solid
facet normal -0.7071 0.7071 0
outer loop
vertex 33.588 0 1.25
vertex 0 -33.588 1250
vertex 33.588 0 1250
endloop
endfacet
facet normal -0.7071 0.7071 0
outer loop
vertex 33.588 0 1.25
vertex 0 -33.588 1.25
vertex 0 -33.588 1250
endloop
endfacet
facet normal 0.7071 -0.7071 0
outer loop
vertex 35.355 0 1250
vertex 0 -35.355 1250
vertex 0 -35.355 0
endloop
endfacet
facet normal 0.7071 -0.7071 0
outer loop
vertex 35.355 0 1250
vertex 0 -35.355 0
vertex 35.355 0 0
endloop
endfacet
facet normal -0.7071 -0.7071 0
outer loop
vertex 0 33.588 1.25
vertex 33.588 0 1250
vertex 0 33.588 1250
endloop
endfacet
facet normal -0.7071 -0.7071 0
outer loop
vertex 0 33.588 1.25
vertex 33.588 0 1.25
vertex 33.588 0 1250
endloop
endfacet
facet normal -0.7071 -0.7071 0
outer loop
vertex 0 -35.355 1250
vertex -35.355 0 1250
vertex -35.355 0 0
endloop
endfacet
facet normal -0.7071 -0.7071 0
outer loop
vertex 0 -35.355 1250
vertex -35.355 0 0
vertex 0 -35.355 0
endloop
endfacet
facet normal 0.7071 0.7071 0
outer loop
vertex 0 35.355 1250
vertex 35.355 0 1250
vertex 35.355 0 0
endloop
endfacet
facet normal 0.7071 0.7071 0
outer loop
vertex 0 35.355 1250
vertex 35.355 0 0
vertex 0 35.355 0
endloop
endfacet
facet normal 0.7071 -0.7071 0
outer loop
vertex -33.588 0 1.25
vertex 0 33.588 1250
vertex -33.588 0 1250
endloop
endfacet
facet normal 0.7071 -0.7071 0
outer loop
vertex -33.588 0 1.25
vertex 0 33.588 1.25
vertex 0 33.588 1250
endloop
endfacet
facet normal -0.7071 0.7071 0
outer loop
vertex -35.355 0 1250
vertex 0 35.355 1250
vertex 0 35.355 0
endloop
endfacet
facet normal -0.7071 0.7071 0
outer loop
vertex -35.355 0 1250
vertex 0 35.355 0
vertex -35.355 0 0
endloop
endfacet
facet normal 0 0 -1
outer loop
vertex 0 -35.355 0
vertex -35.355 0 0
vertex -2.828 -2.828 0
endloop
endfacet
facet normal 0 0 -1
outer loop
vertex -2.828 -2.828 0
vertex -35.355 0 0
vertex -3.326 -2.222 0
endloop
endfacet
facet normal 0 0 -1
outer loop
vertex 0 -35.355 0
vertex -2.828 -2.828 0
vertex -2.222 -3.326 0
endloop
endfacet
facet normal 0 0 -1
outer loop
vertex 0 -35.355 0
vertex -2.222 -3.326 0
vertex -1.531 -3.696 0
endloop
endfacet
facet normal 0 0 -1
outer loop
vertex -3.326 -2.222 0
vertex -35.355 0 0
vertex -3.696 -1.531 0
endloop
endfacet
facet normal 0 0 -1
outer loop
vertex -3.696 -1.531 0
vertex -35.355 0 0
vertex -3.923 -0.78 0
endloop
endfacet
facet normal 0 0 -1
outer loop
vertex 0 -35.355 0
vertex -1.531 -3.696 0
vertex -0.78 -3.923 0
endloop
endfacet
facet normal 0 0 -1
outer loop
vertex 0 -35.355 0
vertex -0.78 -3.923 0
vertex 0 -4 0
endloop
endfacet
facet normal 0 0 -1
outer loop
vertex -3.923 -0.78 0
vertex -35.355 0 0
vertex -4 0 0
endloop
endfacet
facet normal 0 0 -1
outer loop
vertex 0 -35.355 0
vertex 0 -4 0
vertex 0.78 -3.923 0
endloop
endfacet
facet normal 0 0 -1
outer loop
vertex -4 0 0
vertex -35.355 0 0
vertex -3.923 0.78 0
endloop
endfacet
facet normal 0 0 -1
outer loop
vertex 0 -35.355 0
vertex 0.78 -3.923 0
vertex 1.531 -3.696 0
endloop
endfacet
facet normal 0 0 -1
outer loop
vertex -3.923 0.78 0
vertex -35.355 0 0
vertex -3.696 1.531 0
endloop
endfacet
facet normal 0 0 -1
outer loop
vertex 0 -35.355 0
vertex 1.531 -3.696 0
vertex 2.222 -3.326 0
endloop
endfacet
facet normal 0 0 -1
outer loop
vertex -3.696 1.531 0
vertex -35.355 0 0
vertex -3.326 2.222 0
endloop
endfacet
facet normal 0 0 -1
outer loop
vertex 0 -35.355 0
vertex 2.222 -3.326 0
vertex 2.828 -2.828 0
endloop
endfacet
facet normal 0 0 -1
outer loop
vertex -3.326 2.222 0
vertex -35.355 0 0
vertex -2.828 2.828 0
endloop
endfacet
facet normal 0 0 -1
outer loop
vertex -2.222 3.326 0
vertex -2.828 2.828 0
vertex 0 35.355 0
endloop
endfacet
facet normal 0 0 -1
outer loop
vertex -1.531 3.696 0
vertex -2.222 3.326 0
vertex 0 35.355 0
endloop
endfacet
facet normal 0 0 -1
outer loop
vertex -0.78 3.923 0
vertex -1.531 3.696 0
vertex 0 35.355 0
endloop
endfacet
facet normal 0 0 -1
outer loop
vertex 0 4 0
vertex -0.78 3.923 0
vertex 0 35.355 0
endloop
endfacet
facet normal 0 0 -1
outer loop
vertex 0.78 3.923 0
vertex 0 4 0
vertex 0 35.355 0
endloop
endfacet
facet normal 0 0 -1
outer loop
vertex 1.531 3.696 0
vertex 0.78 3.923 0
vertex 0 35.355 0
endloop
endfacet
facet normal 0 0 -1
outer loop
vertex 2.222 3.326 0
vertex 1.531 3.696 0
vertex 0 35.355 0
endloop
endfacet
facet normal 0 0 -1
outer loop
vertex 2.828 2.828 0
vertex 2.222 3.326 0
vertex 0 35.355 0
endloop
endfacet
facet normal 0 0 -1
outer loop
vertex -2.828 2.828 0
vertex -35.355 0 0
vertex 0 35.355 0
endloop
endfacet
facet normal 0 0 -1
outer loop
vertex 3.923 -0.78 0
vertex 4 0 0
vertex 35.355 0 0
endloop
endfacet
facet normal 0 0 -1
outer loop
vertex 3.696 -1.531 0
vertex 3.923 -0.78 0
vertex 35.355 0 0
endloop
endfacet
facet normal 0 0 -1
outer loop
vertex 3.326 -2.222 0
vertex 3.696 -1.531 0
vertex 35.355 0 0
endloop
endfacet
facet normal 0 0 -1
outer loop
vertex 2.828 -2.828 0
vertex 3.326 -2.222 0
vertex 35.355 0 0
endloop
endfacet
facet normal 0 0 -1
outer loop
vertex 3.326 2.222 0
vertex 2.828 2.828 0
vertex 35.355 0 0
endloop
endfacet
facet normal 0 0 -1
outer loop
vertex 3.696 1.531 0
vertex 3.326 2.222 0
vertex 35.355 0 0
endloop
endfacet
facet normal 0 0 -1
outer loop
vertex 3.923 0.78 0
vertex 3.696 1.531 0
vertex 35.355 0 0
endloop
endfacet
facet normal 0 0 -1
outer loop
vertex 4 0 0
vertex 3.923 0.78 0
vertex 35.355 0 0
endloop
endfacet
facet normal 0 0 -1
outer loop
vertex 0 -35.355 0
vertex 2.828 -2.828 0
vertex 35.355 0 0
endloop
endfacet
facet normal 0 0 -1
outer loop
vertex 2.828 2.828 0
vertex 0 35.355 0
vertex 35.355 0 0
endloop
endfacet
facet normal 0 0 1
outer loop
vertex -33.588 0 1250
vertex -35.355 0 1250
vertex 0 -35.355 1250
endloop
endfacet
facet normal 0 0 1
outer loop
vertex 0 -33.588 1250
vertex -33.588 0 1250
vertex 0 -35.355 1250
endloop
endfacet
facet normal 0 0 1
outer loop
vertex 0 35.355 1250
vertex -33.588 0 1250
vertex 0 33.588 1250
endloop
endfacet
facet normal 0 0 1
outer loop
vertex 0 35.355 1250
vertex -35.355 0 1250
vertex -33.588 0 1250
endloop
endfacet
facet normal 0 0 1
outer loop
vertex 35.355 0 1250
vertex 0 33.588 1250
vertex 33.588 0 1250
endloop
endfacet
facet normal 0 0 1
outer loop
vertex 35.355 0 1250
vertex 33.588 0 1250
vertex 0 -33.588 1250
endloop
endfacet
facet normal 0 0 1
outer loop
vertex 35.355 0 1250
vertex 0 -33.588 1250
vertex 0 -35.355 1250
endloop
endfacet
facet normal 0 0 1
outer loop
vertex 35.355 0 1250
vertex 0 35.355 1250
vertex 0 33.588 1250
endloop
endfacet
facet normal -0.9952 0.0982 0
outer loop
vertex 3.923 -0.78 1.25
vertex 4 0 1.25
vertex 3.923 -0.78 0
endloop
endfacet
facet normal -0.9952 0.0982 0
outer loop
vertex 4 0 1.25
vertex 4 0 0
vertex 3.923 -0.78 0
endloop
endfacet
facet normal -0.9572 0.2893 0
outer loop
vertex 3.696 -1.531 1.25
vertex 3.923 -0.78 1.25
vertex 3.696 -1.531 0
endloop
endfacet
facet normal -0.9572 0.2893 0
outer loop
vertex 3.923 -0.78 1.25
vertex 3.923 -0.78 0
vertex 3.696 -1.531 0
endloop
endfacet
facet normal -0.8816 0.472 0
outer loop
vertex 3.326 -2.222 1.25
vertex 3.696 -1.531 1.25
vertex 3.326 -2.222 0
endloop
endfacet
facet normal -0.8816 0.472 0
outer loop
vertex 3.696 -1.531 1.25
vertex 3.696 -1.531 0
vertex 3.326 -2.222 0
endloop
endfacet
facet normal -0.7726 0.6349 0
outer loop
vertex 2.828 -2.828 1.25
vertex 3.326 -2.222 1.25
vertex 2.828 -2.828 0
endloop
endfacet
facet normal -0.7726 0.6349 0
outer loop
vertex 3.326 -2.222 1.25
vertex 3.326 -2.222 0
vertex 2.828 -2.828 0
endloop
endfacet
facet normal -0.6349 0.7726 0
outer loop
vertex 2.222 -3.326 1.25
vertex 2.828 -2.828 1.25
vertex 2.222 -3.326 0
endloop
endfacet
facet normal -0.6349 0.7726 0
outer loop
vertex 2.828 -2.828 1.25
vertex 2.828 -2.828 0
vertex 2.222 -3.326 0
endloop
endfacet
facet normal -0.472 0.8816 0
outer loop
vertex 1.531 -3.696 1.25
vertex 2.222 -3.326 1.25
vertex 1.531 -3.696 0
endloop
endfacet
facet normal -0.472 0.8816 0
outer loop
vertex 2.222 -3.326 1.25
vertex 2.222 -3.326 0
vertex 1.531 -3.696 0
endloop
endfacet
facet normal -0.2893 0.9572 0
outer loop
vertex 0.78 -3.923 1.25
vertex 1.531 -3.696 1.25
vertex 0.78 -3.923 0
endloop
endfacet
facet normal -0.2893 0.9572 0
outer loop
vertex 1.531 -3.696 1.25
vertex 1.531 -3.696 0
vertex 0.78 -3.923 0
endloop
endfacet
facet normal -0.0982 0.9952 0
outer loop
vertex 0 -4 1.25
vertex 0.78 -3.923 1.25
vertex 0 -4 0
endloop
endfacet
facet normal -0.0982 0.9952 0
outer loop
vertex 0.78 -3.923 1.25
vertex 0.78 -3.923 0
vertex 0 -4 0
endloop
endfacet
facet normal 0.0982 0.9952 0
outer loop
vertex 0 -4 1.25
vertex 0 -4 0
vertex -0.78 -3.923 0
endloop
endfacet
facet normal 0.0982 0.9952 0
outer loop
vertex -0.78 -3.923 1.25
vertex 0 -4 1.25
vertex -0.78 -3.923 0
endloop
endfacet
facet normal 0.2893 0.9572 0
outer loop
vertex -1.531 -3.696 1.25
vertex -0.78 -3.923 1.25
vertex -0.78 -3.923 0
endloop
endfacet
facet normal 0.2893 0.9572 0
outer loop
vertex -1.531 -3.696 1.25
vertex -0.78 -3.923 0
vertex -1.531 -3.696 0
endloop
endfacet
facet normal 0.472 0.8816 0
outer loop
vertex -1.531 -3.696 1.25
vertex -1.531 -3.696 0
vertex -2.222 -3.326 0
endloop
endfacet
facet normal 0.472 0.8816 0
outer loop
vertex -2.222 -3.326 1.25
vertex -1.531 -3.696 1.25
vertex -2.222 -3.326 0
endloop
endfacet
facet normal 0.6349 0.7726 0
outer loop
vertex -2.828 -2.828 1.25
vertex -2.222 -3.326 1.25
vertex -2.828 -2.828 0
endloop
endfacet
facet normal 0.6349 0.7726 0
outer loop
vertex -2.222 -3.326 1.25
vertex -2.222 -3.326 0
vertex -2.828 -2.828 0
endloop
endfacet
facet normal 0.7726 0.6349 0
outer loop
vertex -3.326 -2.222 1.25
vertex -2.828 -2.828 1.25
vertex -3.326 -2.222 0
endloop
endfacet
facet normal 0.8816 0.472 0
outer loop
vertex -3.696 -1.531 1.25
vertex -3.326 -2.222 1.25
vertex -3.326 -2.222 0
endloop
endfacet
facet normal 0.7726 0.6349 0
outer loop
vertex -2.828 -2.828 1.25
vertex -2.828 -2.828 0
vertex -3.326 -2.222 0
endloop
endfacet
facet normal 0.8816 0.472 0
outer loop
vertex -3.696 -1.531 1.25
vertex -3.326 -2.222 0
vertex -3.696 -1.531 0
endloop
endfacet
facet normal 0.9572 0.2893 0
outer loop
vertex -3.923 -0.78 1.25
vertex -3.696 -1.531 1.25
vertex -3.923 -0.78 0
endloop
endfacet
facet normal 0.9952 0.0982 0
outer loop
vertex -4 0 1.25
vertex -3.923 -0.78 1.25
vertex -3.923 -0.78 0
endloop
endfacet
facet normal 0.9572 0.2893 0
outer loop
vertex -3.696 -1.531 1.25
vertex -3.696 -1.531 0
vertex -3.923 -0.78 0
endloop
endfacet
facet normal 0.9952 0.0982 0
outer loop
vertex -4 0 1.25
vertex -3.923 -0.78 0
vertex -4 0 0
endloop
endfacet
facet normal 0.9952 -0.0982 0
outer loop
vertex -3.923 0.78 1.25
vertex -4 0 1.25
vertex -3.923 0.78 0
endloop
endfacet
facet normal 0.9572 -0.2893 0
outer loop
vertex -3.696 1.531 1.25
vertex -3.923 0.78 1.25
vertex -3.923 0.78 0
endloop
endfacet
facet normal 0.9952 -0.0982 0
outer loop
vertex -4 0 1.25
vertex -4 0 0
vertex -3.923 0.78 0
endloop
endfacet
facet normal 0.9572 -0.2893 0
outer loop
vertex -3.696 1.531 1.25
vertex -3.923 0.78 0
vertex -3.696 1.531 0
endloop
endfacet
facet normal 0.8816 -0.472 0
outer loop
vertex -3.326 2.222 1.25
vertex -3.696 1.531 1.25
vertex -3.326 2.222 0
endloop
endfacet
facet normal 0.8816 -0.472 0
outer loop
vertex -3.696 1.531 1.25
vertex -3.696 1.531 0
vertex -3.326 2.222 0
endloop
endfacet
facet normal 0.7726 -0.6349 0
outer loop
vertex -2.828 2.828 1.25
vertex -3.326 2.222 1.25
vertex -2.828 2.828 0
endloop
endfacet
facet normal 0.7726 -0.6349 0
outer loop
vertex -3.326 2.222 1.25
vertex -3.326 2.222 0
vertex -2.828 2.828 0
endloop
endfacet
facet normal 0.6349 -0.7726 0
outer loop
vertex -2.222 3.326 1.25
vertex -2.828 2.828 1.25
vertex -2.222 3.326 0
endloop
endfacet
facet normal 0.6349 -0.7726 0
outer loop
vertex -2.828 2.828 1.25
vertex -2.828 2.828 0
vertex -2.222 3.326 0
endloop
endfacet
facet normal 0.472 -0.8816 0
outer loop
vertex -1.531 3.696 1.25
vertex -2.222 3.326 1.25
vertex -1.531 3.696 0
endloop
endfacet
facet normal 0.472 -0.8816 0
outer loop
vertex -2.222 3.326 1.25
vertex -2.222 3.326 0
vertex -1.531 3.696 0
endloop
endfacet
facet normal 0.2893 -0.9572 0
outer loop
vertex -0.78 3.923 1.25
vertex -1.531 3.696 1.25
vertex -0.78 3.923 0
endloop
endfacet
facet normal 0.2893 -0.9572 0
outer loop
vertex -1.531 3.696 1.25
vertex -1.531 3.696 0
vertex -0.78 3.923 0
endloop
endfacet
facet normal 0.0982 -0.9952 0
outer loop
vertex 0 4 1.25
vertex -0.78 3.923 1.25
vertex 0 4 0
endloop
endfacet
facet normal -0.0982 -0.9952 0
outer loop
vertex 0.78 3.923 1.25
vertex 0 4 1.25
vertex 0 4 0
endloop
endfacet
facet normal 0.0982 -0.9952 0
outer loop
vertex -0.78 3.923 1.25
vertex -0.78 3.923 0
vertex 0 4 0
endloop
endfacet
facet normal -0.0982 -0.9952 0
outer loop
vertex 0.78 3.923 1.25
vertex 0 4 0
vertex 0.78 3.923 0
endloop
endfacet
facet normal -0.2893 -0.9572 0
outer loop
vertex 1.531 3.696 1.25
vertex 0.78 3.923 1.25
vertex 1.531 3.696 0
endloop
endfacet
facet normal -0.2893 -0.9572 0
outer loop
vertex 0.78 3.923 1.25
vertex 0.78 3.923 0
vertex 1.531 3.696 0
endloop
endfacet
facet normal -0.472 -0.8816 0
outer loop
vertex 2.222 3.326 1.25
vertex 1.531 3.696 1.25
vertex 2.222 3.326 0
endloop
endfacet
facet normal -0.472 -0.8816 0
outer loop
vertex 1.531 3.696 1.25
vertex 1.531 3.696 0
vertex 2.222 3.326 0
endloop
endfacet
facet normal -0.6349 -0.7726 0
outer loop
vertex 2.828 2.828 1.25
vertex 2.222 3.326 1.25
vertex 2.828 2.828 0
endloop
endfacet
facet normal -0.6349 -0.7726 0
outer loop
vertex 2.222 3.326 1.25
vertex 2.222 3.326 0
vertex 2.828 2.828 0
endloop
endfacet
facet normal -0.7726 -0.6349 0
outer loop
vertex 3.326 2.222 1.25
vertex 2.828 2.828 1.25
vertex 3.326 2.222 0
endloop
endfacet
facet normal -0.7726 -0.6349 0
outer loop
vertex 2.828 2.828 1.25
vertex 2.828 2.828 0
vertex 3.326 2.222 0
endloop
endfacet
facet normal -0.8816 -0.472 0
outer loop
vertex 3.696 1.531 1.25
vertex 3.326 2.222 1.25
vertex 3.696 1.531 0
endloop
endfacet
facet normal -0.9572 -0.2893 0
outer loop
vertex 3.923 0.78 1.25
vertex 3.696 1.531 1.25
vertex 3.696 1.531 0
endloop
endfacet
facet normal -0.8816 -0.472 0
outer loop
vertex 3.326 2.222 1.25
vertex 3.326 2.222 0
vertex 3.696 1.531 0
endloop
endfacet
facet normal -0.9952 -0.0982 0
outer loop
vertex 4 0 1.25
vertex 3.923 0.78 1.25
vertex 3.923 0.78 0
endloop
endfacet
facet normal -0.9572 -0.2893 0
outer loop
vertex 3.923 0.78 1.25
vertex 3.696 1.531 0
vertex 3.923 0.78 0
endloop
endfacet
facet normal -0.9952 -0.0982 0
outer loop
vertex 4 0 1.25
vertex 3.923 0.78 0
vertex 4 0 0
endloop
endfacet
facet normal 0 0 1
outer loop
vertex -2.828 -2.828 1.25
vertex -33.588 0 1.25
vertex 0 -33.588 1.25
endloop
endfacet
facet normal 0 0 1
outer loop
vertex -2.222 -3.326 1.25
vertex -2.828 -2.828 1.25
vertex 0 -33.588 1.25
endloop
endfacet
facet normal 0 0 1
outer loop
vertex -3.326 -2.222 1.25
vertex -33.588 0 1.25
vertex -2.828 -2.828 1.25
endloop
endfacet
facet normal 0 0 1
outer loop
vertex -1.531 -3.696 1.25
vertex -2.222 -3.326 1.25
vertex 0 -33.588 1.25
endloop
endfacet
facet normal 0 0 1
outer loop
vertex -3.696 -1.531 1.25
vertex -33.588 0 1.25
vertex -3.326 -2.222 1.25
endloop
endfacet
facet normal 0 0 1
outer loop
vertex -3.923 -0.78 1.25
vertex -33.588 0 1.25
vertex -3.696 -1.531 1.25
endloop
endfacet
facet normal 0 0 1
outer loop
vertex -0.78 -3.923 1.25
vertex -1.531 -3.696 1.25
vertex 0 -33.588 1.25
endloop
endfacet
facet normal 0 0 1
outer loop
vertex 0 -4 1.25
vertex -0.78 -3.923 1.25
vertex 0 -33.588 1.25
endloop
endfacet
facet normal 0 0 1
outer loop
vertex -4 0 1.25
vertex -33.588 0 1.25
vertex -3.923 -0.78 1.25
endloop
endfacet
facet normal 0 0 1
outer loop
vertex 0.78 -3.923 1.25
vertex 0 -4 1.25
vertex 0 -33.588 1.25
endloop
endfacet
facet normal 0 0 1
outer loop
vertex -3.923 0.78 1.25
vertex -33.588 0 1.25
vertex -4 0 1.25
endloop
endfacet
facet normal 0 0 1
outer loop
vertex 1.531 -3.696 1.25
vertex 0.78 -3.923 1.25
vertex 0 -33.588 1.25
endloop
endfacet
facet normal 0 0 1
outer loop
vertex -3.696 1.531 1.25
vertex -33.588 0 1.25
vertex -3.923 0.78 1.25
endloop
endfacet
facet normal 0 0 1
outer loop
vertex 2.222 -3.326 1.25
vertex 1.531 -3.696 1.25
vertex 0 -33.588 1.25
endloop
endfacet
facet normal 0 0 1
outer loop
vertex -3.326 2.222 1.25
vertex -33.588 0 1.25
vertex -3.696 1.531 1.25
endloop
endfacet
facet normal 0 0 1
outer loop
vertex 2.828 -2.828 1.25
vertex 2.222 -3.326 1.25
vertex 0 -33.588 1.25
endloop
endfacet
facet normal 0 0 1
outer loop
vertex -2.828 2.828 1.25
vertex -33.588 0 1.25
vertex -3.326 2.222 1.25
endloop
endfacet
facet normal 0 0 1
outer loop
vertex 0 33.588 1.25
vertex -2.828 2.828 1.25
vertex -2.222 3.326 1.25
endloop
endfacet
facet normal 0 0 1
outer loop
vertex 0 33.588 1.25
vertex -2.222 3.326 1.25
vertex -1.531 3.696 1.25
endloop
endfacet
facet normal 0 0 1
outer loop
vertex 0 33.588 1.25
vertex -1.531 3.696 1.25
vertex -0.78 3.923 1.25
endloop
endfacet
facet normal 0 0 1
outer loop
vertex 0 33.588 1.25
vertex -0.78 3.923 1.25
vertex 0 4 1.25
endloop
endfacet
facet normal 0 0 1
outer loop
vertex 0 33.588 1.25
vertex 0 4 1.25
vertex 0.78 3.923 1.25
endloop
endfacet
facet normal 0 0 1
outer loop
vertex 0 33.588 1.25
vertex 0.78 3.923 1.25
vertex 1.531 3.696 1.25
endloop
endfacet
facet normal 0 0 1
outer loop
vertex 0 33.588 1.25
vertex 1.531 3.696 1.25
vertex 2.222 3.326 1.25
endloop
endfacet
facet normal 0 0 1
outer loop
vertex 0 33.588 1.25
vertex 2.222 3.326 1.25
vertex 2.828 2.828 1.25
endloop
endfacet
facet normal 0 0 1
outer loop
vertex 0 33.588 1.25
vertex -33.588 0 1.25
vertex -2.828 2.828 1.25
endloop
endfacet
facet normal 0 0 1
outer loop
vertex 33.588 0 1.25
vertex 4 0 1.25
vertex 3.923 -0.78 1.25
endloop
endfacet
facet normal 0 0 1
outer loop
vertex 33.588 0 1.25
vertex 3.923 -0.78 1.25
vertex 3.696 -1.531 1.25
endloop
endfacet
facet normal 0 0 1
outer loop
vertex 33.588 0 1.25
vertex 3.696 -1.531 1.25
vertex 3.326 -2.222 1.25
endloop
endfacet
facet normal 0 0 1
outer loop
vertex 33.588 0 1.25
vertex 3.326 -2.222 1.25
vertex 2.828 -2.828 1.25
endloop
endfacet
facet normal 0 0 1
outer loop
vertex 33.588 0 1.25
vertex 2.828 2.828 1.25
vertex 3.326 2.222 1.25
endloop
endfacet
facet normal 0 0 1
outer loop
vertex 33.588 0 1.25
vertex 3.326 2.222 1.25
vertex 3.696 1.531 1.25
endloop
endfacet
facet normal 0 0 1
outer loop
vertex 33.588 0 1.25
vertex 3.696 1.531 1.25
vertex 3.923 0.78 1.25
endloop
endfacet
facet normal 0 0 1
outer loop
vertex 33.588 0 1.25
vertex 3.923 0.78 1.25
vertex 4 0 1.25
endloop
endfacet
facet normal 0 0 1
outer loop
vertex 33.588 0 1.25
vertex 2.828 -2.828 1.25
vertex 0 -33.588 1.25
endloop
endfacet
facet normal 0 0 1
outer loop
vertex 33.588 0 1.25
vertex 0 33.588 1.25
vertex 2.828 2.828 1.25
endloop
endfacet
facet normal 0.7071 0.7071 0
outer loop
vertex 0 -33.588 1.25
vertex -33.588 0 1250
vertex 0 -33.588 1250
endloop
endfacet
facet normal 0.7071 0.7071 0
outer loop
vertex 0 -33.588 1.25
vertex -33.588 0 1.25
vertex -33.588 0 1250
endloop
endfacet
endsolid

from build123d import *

# Parameters (mm, degrees)
F1_DEPTH = 1250
F2_T     = -1.25
F3_R     = 4
F4_DEPTH = 12.5


with BuildPart() as f1:
    # F0 (on Top) → F1 (new body)
    with BuildSketch(Plane.XY):
        Polygon((35.355339, 0), (0, 35.355339), (-35.355339, 0), (0, -35.355339), align=None)
    extrude(amount=F1_DEPTH)

    # F2
    f2_openings = [f1.faces().sort_by_distance(p)[0] for p in [
        (0, 0, 1250),
    ]]
    offset(amount=F2_T, openings=f2_openings)

    # F3 (on face) → F4 (cut, symmetric)
    with BuildSketch(Plane(origin=(0, 0, 0), x_dir=(1, 0, 0), z_dir=(0, 0, -1))):
        Circle(F3_R)
    extrude(amount=F4_DEPTH, both=True, mode=Mode.SUBTRACT)


solid = f1.part
